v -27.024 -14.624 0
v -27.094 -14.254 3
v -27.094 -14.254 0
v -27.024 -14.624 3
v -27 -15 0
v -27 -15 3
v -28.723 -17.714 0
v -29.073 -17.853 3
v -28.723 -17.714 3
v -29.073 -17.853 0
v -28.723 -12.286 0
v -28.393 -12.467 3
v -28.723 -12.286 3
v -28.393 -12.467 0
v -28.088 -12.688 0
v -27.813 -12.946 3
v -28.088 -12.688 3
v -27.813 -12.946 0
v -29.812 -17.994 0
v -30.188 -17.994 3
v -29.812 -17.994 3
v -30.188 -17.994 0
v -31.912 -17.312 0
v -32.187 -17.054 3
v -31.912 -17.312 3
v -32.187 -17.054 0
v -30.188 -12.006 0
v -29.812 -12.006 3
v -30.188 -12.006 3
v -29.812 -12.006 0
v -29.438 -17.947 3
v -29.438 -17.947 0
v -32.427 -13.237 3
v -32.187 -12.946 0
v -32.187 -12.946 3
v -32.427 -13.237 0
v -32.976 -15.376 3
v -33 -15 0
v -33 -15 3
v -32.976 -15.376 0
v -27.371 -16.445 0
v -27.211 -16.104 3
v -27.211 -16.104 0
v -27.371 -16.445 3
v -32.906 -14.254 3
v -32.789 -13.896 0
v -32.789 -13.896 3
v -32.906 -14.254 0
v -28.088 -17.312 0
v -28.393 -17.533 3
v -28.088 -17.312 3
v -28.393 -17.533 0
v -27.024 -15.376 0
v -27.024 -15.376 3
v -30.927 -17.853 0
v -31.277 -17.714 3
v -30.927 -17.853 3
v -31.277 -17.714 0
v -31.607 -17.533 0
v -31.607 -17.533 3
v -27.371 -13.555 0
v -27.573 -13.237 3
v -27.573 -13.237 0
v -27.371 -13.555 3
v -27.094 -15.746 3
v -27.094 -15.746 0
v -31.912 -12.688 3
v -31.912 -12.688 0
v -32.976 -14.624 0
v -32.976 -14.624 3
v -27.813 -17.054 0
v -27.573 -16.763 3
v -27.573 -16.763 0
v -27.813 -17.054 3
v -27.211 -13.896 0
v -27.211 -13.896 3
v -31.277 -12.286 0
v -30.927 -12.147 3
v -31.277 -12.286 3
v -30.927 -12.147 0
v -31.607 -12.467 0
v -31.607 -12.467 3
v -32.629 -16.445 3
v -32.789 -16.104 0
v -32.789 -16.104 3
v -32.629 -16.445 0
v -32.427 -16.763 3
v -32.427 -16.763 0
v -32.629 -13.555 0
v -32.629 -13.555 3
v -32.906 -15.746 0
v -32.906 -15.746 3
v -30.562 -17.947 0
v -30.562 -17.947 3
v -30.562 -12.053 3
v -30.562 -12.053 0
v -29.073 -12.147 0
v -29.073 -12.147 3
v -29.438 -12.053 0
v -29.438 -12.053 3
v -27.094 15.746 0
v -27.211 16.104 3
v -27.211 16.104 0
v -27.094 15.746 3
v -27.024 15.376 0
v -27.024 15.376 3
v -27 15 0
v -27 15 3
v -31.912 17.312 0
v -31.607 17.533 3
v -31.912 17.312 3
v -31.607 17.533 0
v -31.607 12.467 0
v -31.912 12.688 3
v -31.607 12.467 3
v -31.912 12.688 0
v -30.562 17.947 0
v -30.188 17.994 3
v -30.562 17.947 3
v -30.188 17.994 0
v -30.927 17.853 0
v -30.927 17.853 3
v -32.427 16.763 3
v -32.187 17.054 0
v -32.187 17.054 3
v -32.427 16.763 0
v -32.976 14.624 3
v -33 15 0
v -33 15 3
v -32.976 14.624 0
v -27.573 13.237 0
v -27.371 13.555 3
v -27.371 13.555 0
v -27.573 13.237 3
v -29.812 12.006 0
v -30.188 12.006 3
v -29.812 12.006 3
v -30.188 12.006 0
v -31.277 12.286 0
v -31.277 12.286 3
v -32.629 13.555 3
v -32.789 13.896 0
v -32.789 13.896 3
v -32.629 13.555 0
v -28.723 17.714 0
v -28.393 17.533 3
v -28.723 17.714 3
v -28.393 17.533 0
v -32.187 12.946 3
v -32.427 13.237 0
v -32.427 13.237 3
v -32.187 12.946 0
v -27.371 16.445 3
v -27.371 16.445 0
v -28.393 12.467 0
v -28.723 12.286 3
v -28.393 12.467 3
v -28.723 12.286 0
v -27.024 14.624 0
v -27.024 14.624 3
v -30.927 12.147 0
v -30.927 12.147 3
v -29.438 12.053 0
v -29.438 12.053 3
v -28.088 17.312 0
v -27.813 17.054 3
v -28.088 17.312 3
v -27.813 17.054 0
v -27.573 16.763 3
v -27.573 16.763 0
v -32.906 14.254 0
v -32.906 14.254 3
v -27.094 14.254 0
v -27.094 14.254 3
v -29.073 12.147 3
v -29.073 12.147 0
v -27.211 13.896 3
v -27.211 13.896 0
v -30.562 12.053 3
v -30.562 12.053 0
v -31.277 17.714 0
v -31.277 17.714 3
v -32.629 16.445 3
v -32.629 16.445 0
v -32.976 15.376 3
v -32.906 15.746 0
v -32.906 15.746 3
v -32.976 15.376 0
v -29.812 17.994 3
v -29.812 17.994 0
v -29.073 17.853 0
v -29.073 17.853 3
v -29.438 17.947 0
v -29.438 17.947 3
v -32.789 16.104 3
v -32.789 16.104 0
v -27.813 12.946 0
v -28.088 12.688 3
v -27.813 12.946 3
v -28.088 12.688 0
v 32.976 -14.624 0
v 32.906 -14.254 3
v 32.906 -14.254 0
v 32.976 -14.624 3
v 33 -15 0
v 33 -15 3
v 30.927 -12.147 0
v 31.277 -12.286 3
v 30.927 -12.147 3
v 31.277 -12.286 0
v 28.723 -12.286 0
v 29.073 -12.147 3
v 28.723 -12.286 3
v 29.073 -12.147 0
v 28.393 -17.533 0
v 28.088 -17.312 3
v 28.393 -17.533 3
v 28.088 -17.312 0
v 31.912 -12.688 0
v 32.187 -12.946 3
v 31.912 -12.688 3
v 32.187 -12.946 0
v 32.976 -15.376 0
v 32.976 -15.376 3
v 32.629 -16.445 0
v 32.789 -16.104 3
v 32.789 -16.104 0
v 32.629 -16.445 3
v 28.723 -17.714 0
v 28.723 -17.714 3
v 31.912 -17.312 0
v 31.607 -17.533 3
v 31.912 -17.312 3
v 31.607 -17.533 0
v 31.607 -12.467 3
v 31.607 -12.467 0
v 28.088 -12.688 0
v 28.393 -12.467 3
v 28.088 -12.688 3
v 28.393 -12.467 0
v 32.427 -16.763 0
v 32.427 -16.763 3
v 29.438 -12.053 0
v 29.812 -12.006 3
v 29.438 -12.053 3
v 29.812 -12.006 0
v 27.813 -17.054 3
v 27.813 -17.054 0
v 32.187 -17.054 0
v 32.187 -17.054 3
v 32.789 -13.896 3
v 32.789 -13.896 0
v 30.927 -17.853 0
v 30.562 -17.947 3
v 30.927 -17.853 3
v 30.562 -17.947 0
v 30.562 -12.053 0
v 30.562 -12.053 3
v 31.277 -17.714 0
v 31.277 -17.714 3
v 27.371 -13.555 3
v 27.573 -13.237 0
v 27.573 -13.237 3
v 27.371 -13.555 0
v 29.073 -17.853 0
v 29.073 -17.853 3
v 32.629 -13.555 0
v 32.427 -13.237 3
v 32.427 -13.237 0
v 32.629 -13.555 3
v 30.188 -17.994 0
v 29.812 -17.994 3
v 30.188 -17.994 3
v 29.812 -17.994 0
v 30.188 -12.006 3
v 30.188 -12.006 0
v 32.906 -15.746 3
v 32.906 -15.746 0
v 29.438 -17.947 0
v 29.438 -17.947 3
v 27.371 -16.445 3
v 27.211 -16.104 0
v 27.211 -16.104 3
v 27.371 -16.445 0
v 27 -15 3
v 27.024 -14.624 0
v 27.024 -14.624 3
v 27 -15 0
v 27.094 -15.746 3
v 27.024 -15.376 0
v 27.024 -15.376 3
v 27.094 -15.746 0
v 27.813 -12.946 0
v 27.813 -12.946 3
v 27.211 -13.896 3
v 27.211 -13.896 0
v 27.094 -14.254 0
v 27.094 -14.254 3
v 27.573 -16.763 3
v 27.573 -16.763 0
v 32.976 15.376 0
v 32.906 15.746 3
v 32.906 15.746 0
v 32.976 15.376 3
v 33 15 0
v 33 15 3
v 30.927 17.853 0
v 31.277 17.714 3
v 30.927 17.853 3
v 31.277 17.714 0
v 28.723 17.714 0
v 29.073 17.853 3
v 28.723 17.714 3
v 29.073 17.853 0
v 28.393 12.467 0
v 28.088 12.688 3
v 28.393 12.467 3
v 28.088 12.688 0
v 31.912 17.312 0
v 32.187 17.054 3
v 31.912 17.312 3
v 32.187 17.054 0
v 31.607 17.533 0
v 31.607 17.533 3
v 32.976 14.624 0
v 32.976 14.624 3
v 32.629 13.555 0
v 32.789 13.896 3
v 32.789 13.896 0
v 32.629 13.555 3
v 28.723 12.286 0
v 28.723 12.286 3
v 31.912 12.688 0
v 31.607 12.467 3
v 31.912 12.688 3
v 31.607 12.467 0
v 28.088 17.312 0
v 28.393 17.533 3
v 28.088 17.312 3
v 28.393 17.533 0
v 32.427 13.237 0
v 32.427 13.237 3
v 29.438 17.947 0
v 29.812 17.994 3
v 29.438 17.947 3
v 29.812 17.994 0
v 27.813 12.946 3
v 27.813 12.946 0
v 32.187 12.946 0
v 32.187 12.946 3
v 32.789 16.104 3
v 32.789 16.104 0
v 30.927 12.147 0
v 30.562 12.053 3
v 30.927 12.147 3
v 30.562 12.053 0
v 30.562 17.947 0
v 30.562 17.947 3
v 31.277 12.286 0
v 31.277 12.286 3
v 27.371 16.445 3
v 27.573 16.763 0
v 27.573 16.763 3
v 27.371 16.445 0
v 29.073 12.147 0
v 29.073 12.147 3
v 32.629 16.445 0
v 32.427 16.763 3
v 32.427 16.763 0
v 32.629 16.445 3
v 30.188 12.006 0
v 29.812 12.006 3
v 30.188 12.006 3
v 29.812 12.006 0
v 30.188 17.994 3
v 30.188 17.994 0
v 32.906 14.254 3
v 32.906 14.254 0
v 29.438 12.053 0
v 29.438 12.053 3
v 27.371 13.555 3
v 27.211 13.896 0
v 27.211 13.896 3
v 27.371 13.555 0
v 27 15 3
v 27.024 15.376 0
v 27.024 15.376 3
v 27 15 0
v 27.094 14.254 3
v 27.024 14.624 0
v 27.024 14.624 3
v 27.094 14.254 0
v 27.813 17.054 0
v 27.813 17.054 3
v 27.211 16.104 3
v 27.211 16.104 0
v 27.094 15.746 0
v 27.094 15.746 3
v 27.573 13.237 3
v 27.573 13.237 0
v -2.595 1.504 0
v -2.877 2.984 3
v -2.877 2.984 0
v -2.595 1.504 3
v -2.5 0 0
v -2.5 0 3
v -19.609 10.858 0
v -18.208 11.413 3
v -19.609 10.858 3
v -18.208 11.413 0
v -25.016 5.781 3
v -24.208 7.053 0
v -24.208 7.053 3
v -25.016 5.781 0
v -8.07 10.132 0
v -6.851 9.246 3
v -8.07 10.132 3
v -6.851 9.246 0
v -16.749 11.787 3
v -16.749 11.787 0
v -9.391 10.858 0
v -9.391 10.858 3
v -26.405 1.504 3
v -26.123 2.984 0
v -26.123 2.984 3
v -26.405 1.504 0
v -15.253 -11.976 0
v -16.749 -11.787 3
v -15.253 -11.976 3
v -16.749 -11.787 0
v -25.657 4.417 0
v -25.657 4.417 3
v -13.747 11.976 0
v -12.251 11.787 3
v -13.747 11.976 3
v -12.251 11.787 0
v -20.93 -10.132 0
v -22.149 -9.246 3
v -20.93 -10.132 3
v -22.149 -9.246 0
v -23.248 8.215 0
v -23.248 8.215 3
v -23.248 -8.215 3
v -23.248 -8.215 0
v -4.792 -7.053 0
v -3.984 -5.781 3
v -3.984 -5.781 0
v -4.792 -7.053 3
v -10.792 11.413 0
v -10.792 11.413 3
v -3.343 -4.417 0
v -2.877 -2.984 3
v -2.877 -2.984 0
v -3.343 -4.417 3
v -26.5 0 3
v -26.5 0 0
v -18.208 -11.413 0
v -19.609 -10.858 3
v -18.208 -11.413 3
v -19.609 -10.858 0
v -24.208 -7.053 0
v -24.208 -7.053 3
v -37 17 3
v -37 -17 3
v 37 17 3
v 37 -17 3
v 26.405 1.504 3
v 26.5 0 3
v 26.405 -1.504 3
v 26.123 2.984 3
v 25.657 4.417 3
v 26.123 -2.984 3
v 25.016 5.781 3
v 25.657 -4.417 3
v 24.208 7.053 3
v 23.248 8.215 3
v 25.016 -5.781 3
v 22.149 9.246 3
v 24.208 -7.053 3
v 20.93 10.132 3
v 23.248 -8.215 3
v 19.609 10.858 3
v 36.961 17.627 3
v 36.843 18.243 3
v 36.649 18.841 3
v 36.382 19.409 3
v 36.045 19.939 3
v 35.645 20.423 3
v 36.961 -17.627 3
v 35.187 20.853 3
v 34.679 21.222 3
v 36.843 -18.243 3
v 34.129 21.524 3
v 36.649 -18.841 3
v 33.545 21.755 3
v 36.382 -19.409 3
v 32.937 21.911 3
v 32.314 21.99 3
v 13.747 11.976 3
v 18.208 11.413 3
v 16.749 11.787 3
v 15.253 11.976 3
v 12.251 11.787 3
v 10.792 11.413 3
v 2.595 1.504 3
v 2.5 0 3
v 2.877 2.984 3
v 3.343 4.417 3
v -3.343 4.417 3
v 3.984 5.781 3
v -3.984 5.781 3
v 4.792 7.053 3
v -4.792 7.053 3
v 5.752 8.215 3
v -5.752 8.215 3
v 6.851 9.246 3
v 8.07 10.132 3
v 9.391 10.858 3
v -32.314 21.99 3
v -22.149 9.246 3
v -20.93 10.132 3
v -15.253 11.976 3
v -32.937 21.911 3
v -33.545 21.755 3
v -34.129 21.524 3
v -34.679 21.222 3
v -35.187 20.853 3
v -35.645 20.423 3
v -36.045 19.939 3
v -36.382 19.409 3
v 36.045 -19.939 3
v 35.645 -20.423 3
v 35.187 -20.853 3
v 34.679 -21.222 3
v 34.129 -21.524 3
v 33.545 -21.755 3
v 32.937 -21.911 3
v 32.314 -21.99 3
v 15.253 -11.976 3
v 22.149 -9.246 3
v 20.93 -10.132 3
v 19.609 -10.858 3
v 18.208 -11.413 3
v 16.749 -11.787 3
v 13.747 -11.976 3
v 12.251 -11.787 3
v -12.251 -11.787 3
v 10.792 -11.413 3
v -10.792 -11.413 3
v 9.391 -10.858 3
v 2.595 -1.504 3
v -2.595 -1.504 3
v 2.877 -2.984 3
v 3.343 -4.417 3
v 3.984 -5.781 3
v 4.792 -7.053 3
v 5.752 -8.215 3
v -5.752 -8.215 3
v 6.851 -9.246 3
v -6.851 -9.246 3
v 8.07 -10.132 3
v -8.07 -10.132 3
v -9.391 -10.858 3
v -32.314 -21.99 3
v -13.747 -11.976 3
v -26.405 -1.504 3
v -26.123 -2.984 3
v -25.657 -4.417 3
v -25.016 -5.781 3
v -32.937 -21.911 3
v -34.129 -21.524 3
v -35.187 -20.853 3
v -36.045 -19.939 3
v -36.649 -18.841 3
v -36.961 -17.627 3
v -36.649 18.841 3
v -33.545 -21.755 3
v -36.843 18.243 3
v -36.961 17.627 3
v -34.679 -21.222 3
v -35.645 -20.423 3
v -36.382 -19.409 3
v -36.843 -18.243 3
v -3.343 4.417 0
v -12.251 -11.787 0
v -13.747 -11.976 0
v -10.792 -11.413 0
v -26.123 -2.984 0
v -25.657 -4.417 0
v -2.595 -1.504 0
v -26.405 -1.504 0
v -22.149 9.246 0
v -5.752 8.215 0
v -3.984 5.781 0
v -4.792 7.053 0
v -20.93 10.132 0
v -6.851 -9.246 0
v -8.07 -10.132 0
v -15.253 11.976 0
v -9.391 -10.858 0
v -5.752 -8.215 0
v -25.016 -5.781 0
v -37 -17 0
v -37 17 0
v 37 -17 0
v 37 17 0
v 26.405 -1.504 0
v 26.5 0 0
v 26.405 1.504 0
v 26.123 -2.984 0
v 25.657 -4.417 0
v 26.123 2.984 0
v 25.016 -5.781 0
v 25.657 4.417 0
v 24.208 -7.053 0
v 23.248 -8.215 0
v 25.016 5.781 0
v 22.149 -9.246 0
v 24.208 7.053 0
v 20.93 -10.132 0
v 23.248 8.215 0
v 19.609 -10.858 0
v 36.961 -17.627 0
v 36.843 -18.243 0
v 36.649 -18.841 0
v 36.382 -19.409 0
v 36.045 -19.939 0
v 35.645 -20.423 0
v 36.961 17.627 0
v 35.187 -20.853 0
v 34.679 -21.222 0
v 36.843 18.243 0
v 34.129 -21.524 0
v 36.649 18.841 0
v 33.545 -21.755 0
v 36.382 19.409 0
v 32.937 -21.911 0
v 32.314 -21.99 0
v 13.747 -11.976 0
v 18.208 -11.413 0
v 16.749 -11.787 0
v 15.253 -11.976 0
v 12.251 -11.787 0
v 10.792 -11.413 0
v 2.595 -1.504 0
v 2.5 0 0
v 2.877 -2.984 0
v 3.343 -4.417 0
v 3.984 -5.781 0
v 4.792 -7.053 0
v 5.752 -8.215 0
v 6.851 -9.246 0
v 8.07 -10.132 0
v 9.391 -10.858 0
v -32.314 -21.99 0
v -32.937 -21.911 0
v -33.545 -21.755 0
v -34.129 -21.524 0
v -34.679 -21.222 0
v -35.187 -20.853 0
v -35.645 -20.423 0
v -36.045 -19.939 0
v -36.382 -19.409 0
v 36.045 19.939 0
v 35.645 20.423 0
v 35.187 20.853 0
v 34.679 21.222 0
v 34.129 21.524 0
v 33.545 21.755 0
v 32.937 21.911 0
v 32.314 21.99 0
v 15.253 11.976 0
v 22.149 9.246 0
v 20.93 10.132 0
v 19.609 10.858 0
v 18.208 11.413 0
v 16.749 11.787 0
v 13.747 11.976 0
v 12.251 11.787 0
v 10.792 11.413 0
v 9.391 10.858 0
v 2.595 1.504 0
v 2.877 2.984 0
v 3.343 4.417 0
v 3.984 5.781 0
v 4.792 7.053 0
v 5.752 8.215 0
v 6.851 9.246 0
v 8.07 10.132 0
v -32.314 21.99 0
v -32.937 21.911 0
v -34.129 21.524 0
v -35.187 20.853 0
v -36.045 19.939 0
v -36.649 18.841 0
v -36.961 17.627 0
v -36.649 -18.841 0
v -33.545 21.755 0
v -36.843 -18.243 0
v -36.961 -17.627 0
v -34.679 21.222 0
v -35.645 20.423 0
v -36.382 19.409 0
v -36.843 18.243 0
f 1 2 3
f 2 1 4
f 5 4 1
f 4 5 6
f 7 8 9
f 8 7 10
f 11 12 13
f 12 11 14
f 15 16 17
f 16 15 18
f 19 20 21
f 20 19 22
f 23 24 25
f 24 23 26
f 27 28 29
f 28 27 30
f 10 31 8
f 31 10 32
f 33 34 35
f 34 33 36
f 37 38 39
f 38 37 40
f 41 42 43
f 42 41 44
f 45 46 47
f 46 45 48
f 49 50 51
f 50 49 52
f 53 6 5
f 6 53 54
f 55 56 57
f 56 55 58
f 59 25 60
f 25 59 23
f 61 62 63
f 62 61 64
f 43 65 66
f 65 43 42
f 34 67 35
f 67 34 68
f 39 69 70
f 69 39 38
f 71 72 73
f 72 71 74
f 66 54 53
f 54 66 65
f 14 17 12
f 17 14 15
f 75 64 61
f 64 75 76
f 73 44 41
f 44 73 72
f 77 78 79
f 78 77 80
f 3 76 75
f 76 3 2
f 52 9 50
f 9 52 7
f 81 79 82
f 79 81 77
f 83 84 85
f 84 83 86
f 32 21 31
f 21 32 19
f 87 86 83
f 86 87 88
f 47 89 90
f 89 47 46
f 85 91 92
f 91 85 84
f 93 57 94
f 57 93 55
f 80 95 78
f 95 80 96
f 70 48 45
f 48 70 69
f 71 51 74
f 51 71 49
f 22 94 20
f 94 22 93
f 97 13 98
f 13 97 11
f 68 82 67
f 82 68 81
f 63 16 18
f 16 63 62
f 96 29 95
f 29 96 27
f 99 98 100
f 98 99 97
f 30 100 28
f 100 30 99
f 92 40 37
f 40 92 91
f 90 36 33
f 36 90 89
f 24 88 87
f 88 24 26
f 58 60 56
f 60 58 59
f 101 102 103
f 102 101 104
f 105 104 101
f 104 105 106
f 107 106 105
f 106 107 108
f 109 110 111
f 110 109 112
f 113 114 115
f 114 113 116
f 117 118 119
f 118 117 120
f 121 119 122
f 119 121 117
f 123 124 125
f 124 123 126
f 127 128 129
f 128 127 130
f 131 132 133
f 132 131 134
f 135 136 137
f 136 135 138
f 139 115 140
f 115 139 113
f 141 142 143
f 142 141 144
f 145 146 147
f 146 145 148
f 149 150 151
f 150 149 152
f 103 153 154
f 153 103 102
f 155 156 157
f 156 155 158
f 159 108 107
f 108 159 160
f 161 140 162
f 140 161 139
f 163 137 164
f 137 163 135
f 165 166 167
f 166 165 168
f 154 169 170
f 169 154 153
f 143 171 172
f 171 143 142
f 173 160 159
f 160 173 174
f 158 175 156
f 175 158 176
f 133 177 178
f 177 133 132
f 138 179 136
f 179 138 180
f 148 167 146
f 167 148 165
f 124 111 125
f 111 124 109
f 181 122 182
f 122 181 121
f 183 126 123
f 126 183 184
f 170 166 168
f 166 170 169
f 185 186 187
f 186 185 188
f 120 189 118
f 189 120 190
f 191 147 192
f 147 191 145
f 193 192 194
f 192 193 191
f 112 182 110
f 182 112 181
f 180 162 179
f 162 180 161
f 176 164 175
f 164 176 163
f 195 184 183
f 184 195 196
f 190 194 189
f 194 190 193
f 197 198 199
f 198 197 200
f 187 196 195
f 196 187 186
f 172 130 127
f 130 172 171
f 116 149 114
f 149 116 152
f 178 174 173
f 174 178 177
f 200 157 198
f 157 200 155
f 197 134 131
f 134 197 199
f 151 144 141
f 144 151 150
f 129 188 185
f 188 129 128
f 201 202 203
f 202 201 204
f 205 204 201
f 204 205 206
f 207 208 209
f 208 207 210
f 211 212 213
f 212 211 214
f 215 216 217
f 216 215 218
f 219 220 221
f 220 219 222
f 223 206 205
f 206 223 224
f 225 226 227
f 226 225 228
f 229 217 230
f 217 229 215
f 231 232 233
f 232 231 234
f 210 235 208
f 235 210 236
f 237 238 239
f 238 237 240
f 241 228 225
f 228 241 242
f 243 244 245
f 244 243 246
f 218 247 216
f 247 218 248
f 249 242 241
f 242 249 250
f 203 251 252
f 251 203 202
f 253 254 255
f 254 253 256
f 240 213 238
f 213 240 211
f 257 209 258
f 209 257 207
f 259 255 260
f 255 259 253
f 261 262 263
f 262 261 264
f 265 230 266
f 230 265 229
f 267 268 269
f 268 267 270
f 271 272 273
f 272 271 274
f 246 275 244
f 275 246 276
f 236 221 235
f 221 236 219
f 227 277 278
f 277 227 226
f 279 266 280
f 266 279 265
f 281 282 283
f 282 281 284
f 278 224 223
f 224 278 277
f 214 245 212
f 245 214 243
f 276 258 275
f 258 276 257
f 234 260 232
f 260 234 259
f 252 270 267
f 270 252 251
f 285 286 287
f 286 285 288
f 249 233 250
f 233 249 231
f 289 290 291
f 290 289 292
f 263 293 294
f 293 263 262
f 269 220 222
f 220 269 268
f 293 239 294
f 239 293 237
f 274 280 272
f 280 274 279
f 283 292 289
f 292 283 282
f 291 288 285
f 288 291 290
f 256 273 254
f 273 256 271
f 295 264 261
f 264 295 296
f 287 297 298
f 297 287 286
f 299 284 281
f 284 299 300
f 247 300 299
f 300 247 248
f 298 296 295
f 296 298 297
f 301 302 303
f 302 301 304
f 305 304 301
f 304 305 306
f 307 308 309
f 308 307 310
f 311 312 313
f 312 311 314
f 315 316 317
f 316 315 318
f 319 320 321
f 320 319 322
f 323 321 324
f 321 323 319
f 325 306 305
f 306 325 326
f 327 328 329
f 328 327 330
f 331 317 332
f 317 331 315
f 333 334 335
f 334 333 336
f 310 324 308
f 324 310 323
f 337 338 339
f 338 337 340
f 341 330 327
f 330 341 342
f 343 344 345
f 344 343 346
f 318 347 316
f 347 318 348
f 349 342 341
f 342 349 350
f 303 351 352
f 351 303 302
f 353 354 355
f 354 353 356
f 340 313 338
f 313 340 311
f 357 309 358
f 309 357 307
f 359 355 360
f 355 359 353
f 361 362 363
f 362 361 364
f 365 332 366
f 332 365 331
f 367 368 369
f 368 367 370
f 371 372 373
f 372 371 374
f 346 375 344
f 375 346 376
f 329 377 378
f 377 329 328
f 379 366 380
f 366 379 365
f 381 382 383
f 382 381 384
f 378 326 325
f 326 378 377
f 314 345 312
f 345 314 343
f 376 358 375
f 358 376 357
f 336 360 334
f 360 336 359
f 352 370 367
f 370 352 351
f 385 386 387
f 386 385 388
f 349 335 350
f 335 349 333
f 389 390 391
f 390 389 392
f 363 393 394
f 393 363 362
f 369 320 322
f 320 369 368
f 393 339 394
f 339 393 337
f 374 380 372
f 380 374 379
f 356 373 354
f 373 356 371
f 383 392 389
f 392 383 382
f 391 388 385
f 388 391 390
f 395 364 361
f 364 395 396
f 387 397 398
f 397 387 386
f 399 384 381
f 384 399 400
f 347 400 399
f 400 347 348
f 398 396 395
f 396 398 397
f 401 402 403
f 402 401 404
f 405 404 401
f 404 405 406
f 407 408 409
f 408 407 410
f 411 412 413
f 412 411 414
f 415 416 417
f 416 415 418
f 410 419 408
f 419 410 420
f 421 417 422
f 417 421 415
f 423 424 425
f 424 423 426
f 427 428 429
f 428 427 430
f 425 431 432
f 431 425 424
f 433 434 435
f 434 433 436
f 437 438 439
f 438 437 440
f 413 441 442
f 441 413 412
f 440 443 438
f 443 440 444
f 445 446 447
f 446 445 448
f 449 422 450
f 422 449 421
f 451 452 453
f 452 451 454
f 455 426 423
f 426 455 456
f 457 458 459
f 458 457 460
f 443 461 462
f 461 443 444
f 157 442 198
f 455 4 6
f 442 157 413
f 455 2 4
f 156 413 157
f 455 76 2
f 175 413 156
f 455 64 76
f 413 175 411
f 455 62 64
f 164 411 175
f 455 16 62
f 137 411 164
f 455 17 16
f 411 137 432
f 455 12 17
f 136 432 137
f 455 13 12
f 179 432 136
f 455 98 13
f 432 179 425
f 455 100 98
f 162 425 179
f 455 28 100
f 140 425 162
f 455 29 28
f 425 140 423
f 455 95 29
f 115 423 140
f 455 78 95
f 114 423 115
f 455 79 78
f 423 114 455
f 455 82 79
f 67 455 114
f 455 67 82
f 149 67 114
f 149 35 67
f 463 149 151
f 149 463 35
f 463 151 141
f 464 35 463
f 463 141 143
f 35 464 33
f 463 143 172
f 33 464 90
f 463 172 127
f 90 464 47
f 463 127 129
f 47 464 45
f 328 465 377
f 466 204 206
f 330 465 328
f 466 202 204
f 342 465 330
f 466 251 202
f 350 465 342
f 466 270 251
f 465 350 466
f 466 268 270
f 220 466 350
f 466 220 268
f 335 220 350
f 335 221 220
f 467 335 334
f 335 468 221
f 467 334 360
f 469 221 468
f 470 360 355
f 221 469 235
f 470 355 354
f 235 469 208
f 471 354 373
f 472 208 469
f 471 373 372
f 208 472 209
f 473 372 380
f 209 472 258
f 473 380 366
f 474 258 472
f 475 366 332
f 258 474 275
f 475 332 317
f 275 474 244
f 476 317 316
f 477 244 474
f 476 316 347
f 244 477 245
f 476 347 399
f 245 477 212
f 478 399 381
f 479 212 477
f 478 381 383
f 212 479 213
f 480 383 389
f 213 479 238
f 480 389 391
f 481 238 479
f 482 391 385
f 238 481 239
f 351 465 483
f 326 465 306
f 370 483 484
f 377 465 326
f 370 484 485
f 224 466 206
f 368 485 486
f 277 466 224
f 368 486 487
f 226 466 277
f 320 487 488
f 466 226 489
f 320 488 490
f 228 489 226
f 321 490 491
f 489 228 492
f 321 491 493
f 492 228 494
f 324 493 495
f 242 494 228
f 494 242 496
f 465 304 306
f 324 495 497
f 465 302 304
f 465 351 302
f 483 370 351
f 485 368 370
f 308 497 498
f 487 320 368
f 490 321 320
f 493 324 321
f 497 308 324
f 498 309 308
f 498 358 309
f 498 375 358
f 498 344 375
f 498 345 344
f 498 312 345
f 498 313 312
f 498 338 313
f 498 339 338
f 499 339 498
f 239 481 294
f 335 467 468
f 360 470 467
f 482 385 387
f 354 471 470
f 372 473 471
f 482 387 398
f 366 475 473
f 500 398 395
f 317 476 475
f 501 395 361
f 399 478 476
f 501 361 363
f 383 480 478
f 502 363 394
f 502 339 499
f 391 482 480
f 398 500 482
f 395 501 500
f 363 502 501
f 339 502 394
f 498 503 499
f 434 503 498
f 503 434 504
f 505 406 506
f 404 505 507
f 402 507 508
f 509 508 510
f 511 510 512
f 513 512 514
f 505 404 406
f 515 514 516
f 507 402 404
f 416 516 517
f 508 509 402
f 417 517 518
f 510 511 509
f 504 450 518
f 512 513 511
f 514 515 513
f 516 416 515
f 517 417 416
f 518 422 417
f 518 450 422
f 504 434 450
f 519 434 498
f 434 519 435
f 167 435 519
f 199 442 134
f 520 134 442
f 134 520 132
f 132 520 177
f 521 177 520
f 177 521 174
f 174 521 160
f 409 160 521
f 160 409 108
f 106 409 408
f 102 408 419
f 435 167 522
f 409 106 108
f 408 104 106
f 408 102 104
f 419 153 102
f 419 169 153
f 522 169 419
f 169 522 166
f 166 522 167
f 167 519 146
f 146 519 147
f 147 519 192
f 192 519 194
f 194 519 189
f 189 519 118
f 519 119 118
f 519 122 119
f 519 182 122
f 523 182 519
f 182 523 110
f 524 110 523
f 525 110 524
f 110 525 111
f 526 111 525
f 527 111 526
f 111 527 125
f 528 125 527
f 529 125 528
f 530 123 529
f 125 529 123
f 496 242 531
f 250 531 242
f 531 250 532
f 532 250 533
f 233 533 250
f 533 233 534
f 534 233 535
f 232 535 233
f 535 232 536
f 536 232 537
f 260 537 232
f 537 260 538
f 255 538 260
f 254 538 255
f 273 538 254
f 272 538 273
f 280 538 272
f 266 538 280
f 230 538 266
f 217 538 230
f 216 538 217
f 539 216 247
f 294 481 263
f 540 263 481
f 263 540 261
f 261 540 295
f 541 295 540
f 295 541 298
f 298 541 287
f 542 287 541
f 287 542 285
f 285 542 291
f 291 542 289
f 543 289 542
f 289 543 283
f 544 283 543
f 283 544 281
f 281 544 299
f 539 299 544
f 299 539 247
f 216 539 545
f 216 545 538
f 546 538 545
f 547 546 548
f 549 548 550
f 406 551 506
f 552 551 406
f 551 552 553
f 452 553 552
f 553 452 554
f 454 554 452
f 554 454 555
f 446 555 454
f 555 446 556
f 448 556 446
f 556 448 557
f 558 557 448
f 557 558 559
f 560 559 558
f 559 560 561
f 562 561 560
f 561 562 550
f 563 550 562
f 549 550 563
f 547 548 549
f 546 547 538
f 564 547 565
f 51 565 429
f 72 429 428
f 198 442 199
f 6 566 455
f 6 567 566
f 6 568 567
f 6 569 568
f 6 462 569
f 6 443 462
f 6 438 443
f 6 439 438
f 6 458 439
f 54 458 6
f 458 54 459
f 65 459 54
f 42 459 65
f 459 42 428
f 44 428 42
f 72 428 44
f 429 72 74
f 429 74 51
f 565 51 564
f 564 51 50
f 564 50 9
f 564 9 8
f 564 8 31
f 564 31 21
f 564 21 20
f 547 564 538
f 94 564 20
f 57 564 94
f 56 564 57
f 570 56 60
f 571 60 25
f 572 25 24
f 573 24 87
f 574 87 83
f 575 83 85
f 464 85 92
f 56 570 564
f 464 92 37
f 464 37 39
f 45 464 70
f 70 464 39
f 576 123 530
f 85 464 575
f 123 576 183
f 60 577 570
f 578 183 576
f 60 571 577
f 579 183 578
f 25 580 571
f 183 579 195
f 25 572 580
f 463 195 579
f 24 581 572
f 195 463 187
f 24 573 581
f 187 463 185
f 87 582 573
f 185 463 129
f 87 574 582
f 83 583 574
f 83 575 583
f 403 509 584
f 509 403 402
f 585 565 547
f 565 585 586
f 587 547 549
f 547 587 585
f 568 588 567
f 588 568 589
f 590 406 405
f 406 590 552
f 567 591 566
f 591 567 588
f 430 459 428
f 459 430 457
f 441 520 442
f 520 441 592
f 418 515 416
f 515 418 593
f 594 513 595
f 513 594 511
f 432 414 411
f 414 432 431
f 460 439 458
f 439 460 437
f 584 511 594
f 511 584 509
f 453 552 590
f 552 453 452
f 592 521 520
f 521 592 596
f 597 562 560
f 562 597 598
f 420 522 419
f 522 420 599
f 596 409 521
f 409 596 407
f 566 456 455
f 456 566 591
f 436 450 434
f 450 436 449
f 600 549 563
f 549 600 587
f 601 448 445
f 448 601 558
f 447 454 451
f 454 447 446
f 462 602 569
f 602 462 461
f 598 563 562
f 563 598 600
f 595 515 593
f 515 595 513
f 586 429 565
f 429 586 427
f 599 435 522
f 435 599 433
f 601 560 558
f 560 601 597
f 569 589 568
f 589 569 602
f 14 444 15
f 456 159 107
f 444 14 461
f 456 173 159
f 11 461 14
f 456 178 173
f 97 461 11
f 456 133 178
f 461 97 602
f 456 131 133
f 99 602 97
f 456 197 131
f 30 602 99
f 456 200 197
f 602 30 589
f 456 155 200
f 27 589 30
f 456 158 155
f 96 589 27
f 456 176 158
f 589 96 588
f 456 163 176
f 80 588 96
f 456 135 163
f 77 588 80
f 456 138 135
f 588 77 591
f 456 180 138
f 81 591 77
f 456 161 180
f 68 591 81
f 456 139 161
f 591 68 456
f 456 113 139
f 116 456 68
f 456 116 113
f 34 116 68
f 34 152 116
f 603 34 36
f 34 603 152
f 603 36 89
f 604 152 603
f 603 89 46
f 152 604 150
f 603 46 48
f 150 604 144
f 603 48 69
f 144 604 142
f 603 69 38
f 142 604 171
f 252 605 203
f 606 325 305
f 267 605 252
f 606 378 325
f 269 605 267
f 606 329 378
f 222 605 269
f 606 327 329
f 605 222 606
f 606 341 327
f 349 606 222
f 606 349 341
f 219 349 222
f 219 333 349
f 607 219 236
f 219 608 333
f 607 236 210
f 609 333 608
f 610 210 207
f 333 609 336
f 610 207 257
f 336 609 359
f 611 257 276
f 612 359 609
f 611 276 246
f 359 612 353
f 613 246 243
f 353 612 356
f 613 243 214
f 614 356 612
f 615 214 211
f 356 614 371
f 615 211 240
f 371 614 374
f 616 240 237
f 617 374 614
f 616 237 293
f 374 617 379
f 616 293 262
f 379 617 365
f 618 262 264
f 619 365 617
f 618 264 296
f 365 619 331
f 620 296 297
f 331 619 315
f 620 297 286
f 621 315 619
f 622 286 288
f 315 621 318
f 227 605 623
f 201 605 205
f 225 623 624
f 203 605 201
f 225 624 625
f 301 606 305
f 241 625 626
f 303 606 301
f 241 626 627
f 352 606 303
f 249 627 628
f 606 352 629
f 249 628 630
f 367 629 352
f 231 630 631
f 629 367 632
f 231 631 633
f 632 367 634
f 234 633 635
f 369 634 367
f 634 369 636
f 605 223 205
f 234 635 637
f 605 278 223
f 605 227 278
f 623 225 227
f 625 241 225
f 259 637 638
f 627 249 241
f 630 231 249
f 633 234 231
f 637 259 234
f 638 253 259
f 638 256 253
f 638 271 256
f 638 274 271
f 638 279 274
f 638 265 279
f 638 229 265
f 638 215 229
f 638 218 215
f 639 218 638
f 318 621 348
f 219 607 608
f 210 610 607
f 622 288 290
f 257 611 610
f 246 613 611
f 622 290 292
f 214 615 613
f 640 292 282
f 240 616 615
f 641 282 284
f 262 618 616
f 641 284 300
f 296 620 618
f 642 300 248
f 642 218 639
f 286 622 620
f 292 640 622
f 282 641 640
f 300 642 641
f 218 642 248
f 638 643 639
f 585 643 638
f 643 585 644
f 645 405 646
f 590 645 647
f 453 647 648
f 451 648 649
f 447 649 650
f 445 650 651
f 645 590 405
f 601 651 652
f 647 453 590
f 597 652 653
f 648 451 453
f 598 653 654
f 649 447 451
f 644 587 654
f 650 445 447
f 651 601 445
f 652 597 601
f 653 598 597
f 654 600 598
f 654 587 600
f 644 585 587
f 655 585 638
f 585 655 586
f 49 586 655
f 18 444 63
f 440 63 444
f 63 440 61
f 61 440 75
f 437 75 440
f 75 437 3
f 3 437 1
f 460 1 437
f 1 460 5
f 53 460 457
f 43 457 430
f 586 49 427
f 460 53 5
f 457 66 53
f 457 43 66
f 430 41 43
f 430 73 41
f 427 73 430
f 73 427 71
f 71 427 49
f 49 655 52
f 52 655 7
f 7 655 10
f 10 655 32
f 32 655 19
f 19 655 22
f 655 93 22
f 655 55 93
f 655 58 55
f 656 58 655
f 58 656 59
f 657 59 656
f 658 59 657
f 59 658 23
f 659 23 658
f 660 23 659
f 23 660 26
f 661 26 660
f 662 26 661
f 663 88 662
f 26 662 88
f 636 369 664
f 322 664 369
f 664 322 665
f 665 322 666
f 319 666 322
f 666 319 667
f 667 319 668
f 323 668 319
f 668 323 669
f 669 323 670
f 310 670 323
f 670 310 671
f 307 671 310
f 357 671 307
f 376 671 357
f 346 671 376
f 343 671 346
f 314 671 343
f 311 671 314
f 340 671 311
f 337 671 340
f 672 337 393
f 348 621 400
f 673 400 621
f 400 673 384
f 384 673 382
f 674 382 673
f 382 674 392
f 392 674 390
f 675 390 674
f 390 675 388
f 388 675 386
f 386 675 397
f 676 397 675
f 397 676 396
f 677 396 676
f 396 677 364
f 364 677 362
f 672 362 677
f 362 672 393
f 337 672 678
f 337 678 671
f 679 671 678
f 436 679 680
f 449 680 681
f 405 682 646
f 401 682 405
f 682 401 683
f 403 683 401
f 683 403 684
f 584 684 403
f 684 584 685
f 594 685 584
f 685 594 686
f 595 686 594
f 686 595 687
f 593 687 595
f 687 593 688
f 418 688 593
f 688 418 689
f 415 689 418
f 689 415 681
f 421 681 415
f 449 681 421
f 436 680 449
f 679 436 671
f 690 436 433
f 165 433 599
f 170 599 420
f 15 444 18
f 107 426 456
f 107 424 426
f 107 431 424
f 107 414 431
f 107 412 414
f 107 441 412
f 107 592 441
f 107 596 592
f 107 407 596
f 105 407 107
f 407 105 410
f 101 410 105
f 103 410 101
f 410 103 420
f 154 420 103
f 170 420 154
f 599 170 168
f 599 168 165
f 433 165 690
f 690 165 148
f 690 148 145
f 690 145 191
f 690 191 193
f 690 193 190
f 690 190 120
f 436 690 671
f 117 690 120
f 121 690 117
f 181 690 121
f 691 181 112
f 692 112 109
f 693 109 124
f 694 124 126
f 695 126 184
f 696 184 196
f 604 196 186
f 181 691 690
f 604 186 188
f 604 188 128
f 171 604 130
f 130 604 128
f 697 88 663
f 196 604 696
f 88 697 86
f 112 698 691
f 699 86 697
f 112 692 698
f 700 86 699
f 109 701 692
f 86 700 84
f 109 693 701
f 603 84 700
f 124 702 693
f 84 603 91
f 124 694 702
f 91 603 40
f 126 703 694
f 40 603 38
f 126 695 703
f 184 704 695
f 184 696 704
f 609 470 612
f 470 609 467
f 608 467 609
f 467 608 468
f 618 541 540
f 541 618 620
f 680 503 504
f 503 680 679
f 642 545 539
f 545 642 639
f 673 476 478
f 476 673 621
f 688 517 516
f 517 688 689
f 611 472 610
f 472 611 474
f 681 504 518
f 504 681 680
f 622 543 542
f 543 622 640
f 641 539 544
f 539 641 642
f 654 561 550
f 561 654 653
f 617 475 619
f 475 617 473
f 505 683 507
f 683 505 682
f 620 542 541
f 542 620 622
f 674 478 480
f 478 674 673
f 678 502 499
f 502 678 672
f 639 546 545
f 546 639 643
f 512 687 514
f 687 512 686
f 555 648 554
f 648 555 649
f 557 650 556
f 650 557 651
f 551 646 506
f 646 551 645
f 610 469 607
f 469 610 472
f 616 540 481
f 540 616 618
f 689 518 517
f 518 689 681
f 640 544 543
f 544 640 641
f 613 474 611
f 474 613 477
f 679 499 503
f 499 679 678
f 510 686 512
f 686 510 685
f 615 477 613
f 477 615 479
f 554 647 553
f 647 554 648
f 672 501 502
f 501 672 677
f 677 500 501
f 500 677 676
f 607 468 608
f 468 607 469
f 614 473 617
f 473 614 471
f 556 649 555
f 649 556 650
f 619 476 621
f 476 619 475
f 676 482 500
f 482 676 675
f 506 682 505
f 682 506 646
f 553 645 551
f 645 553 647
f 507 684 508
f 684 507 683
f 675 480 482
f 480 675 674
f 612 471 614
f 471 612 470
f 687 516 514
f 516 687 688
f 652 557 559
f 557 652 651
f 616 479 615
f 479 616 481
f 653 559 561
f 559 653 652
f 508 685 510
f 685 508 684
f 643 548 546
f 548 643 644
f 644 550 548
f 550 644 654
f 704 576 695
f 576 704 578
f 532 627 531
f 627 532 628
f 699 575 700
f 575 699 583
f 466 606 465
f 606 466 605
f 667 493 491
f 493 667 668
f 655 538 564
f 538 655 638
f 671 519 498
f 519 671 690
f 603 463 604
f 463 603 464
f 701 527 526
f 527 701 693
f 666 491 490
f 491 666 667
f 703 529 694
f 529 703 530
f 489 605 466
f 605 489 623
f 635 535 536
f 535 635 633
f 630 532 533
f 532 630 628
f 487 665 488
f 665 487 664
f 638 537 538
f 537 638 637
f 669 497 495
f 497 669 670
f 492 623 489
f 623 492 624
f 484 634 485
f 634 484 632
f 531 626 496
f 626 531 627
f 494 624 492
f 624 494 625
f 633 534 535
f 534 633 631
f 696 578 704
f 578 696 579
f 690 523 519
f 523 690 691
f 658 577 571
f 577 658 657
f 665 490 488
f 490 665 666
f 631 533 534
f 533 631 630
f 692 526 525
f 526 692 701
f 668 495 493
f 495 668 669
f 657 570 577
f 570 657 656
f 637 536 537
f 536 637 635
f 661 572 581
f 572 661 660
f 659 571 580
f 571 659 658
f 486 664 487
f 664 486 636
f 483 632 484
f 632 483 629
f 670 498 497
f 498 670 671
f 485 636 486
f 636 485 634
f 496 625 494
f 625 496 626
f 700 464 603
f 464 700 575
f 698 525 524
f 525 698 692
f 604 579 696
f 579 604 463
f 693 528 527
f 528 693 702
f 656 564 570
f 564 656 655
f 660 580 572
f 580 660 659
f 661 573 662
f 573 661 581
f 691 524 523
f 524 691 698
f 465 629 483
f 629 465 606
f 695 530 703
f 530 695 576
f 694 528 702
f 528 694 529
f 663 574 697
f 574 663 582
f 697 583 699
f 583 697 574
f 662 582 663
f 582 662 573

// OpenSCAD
$fn = 50;


difference() {
	union() {
		hull() {
			translate(v = [-32.0000000000, 17.0000000000, 0]) {
				cylinder(h = 3, r = 5);
			}
			translate(v = [32.0000000000, 17.0000000000, 0]) {
				cylinder(h = 3, r = 5);
			}
			translate(v = [-32.0000000000, -17.0000000000, 0]) {
				cylinder(h = 3, r = 5);
			}
			translate(v = [32.0000000000, -17.0000000000, 0]) {
				cylinder(h = 3, r = 5);
			}
		}
	}
	union() {
		#translate(v = [-30.0000000000, -15.0000000000, -100.0000000000]) {
			cylinder(h = 200, r = 3.0000000000);
		}
		#translate(v = [-30.0000000000, 15.0000000000, -100.0000000000]) {
			cylinder(h = 200, r = 3.0000000000);
		}
		#translate(v = [30.0000000000, -15.0000000000, -100.0000000000]) {
			cylinder(h = 200, r = 3.0000000000);
		}
		#translate(v = [30.0000000000, 15.0000000000, -100.0000000000]) {
			cylinder(h = 200, r = 3.0000000000);
		}
		#translate(v = [-14.5000000000, 0, 0]) {
			cylinder(h = 3, r = 12.0000000000);
		}
		#translate(v = [14.5000000000, 0, 0]) {
			cylinder(h = 3, r = 12.0000000000);
		}
	}
}
